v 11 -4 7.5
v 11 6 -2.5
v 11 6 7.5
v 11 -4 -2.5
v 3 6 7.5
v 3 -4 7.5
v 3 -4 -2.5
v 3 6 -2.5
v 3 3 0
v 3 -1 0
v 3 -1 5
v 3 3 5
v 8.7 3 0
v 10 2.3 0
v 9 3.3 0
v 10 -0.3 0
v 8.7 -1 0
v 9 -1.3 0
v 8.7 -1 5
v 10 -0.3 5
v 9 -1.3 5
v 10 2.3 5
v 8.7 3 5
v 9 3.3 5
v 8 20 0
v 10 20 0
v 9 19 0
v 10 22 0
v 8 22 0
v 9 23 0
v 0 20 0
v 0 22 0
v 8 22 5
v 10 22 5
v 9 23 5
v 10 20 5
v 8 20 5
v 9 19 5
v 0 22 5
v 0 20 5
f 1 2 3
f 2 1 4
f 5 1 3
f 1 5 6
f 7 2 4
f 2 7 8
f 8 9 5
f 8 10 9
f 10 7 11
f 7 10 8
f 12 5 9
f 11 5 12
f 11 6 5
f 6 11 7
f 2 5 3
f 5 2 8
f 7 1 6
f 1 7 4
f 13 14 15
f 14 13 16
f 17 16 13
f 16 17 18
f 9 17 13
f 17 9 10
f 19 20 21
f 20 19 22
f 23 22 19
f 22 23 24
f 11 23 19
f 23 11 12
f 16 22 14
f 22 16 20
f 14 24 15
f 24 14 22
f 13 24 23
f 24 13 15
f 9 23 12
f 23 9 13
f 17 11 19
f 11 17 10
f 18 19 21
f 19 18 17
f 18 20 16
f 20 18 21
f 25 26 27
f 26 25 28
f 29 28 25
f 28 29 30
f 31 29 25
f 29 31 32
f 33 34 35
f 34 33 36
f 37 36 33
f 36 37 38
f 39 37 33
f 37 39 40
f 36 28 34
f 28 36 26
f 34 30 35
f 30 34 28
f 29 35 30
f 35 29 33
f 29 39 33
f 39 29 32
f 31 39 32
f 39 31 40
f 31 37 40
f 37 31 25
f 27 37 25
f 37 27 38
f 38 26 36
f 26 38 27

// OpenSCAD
// file: variables.scad
margin = 0.3;
bladeThickness = 2;
bladeWidth = 5;
bladeHeight = 10;
bladeHeadExt = 1;
bladeHeadWidth = bladeThickness + bladeHeadExt * 2;
bladeHeadHeight = 2;
// main file
include <variables.scad>;

module blade() {
        
    polygon(points=[
        [0,0],
        [bladeHeight - bladeHeadHeight, 0],
        [bladeHeight - bladeHeadHeight / 2, - bladeHeadExt],
        [bladeHeight,0],
        [bladeHeight ,bladeThickness],
        [bladeHeight - bladeHeadHeight / 2, bladeThickness + bladeHeadExt],
        [bladeHeight - bladeHeadHeight, bladeThickness],
        [0, bladeThickness]
    ]);

}

module bladeReceiver() {

        polygon(points=[
        [0,0 - bladeHeadExt],
        [bladeHeight - bladeHeadHeight / 2 - margin, 0 - bladeHeadExt],
        [bladeHeight - bladeHeadHeight / 2, - 1 - margin],
        [bladeHeight,0 - margin],
        [bladeHeight ,bladeThickness + margin],
        [bladeHeight - bladeHeadHeight / 2, bladeThickness + 1 + margin],
        [bladeHeight - bladeHeadHeight / 2 - margin, bladeThickness+ bladeHeadExt],
        [0, bladeThickness+ bladeHeadExt]
    ]);

}


translate ([0, 20, 0]) 
{
    linear_extrude(height=bladeWidth, center=false, convexity=10, twist=0) {
        blade();
    }
}

difference() {

translate([3,-bladeHeight/2 + 1,-bladeWidth/2]) {
    cube(size=[bladeHeight - 2, bladeHeight, bladeHeight], center=false);
 }

linear_extrude(height=bladeWidth, center=false, convexity=10, twist=0) { 
    bladeReceiver();
}
}
